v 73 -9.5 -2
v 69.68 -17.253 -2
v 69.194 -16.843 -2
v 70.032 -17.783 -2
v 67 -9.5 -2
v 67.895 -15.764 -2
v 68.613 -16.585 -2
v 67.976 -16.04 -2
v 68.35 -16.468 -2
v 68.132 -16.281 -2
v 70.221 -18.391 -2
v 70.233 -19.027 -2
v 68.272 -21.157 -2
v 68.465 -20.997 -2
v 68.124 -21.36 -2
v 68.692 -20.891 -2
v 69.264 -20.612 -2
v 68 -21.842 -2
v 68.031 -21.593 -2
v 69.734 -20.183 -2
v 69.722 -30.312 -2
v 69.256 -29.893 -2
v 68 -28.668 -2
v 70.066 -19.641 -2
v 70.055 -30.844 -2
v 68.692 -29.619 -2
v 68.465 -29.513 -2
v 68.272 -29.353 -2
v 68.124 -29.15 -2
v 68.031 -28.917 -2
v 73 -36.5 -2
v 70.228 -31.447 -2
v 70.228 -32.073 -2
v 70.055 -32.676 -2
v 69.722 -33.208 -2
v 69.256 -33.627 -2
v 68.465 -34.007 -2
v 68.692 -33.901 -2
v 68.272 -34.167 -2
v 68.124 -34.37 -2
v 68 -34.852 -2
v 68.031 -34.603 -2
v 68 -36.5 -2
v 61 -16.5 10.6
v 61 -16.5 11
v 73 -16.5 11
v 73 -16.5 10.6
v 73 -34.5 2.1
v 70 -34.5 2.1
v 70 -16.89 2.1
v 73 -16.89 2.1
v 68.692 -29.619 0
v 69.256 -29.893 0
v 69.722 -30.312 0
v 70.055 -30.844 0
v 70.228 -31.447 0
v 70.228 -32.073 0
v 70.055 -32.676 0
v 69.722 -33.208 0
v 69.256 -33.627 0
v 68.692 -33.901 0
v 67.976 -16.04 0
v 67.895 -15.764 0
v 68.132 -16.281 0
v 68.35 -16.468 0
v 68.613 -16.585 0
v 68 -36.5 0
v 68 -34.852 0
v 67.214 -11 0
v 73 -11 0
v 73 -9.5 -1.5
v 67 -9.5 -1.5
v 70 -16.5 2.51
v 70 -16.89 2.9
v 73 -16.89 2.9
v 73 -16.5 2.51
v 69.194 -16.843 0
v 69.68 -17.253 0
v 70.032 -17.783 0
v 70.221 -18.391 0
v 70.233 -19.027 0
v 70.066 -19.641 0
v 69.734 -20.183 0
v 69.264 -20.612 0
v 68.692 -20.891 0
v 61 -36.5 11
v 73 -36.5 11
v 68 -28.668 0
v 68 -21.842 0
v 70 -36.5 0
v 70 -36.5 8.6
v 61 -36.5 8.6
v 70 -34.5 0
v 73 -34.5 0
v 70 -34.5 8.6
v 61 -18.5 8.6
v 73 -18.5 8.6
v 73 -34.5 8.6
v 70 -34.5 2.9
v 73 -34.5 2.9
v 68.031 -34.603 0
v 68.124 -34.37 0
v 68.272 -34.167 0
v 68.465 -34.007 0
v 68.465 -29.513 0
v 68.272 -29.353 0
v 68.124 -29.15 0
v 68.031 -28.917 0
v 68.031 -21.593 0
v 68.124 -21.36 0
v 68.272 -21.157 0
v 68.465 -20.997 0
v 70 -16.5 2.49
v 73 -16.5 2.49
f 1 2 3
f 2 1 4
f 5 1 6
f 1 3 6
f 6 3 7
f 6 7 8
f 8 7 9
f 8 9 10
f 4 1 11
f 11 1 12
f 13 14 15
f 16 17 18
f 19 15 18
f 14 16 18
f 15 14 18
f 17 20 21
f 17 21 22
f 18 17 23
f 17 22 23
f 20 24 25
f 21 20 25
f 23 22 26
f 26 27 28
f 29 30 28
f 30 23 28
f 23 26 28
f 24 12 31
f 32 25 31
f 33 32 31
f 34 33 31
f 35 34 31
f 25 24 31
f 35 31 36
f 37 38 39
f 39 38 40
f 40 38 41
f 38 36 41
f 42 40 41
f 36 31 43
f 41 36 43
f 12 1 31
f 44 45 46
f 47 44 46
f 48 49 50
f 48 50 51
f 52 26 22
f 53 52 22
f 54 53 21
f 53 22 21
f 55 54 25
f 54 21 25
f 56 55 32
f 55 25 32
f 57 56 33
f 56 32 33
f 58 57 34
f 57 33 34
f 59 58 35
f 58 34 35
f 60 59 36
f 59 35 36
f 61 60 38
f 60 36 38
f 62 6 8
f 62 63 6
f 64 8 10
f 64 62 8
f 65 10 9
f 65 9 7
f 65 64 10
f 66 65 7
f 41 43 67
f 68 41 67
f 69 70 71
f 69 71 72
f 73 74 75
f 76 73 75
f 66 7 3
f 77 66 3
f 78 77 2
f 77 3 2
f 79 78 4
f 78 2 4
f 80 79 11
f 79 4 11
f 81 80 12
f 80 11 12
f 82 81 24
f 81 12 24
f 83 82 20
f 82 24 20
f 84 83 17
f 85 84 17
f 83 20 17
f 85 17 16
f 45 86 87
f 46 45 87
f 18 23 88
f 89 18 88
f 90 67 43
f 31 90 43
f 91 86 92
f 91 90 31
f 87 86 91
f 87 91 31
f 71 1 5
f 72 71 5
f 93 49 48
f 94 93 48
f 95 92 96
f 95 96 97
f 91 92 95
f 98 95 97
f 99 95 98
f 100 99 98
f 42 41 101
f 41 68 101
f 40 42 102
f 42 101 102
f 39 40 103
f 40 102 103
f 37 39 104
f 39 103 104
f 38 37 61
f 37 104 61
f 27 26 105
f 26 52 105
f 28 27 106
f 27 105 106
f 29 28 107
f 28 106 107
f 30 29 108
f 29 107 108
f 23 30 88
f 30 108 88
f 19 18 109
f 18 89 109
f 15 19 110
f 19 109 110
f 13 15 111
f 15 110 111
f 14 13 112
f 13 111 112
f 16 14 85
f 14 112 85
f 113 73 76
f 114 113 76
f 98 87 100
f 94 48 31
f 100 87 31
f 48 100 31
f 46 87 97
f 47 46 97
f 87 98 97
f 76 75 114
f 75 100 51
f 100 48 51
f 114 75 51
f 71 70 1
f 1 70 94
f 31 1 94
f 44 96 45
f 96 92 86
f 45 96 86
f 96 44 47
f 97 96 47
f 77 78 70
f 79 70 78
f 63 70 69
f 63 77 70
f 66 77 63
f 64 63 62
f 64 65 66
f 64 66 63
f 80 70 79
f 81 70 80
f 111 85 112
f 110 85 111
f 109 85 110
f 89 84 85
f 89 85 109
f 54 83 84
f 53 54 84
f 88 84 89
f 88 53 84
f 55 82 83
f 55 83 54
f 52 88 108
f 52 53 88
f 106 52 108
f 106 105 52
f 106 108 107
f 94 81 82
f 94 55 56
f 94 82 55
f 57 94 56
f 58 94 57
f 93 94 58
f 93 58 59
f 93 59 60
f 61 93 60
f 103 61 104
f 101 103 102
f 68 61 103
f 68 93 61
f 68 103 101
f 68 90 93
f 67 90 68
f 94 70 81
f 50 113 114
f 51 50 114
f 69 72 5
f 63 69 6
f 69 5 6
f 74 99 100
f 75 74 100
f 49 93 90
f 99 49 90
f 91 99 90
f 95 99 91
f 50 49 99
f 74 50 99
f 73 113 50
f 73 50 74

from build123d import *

# Parameters (mm, degrees)
SKETCH029_W     = 3
SKETCH029_H     = 13
PAD015_DEPTH    = 2
SKETCH030_W     = 5
SKETCH030_H     = 2
SKETCH030_W_2   = 3
SKETCH030_H_2   = 0.8
SKETCH030_W_3   = 12
SKETCH030_H_3   = 2.4
PAD016_DEPTH    = 20
PAD021_DEPTH    = 2
POCKET015_DEPTH = 3
FILLET002_R     = 1
CHAMFER_SIZE    = 2
CHAMFER001_SIZE = 1.5
CHAMFER002_SIZE = 0.39


with BuildPart() as part:
    # Sketch029 → Pad015 (new body)
    with BuildSketch(Plane.XZ):
        with Locations((0.5, 4.5)):
            Rectangle(SKETCH029_W, SKETCH029_H)
    extrude(amount=PAD015_DEPTH)

    # Sketch030 (on Face6 of Pad015) → Pad016 (join)
    with BuildSketch(Plane.XZ.offset(2)):
        with Locations((-0.5, -1)):
            Rectangle(SKETCH030_W, SKETCH030_H)
        with Locations((0.5, 2.5)):
            Rectangle(SKETCH030_W_2, SKETCH030_H_2)
        with Locations((-4, 9.8)):
            Rectangle(SKETCH030_W_3, SKETCH030_H_3)
    extrude(amount=-PAD016_DEPTH)

    # Sketch036 (on Face34 of Pad016) → Pad021 (join)
    with BuildSketch(Plane(origin=(0, 0, -2), x_dir=(1, 0, 0), z_dir=(0, 0, -1))):
        Polygon((2, -18), (2, -25), (-4, -25), (-3, -18), align=None)
    extrude(amount=-PAD021_DEPTH)

    # Sketch037 (on Face35 of Pad021) → Pocket015 (cut)
    with BuildSketch(Plane(origin=(0, 0, -2), x_dir=(1, 0, 0), z_dir=(0, 0, -1))):
        with BuildLine():
            ThreePointArc((-3, -4.99), (-0.75, -2.74), (-3, -0.49))
            Line((-3, -4.99), (-3, -0.49))
        make_face()
        with BuildLine():
            ThreePointArc((-3, -18), (-0.75, -15.75), (-3, -13.5))
            Line((-3, -18), (-3, -13.5))
        make_face()
    extrude(amount=-POCKET015_DEPTH, mode=Mode.SUBTRACT)

    # Fillet002
    fillet002_edges = [part.edges().sort_by_distance(p)[0] for p in [
        (-3, 4.99, -1),
        (-3, 13.5, -1),
        (-3, 0.49, -1),
        (-3, 18, -1),
    ]]
    fillet(fillet002_edges, radius=FILLET002_R)

    # Chamfer
    chamfer_edges = [part.edges().sort_by_distance(p)[0] for p in [
        (-4, 18, 8.6),
    ]]
    chamfer(chamfer_edges, length=CHAMFER_SIZE)

    # Chamfer001
    chamfer001_edges = [part.edges().sort_by_distance(p)[0] for p in [
        (-1, 25, 0),
    ]]
    chamfer(chamfer001_edges, length=CHAMFER001_SIZE)

    # Chamfer002
    chamfer002_edges = [part.edges().sort_by_distance(p)[0] for p in [
        (0.5, 18, 2.1),
        (0.5, 18, 2.9),
    ]]
    chamfer(chamfer002_edges, length=CHAMFER002_SIZE)


with BuildPart() as part_1:
    # Body002 placement: moved
    add(part.part.moved(Location((71, -34.5, 0))))


solid = part_1.part
